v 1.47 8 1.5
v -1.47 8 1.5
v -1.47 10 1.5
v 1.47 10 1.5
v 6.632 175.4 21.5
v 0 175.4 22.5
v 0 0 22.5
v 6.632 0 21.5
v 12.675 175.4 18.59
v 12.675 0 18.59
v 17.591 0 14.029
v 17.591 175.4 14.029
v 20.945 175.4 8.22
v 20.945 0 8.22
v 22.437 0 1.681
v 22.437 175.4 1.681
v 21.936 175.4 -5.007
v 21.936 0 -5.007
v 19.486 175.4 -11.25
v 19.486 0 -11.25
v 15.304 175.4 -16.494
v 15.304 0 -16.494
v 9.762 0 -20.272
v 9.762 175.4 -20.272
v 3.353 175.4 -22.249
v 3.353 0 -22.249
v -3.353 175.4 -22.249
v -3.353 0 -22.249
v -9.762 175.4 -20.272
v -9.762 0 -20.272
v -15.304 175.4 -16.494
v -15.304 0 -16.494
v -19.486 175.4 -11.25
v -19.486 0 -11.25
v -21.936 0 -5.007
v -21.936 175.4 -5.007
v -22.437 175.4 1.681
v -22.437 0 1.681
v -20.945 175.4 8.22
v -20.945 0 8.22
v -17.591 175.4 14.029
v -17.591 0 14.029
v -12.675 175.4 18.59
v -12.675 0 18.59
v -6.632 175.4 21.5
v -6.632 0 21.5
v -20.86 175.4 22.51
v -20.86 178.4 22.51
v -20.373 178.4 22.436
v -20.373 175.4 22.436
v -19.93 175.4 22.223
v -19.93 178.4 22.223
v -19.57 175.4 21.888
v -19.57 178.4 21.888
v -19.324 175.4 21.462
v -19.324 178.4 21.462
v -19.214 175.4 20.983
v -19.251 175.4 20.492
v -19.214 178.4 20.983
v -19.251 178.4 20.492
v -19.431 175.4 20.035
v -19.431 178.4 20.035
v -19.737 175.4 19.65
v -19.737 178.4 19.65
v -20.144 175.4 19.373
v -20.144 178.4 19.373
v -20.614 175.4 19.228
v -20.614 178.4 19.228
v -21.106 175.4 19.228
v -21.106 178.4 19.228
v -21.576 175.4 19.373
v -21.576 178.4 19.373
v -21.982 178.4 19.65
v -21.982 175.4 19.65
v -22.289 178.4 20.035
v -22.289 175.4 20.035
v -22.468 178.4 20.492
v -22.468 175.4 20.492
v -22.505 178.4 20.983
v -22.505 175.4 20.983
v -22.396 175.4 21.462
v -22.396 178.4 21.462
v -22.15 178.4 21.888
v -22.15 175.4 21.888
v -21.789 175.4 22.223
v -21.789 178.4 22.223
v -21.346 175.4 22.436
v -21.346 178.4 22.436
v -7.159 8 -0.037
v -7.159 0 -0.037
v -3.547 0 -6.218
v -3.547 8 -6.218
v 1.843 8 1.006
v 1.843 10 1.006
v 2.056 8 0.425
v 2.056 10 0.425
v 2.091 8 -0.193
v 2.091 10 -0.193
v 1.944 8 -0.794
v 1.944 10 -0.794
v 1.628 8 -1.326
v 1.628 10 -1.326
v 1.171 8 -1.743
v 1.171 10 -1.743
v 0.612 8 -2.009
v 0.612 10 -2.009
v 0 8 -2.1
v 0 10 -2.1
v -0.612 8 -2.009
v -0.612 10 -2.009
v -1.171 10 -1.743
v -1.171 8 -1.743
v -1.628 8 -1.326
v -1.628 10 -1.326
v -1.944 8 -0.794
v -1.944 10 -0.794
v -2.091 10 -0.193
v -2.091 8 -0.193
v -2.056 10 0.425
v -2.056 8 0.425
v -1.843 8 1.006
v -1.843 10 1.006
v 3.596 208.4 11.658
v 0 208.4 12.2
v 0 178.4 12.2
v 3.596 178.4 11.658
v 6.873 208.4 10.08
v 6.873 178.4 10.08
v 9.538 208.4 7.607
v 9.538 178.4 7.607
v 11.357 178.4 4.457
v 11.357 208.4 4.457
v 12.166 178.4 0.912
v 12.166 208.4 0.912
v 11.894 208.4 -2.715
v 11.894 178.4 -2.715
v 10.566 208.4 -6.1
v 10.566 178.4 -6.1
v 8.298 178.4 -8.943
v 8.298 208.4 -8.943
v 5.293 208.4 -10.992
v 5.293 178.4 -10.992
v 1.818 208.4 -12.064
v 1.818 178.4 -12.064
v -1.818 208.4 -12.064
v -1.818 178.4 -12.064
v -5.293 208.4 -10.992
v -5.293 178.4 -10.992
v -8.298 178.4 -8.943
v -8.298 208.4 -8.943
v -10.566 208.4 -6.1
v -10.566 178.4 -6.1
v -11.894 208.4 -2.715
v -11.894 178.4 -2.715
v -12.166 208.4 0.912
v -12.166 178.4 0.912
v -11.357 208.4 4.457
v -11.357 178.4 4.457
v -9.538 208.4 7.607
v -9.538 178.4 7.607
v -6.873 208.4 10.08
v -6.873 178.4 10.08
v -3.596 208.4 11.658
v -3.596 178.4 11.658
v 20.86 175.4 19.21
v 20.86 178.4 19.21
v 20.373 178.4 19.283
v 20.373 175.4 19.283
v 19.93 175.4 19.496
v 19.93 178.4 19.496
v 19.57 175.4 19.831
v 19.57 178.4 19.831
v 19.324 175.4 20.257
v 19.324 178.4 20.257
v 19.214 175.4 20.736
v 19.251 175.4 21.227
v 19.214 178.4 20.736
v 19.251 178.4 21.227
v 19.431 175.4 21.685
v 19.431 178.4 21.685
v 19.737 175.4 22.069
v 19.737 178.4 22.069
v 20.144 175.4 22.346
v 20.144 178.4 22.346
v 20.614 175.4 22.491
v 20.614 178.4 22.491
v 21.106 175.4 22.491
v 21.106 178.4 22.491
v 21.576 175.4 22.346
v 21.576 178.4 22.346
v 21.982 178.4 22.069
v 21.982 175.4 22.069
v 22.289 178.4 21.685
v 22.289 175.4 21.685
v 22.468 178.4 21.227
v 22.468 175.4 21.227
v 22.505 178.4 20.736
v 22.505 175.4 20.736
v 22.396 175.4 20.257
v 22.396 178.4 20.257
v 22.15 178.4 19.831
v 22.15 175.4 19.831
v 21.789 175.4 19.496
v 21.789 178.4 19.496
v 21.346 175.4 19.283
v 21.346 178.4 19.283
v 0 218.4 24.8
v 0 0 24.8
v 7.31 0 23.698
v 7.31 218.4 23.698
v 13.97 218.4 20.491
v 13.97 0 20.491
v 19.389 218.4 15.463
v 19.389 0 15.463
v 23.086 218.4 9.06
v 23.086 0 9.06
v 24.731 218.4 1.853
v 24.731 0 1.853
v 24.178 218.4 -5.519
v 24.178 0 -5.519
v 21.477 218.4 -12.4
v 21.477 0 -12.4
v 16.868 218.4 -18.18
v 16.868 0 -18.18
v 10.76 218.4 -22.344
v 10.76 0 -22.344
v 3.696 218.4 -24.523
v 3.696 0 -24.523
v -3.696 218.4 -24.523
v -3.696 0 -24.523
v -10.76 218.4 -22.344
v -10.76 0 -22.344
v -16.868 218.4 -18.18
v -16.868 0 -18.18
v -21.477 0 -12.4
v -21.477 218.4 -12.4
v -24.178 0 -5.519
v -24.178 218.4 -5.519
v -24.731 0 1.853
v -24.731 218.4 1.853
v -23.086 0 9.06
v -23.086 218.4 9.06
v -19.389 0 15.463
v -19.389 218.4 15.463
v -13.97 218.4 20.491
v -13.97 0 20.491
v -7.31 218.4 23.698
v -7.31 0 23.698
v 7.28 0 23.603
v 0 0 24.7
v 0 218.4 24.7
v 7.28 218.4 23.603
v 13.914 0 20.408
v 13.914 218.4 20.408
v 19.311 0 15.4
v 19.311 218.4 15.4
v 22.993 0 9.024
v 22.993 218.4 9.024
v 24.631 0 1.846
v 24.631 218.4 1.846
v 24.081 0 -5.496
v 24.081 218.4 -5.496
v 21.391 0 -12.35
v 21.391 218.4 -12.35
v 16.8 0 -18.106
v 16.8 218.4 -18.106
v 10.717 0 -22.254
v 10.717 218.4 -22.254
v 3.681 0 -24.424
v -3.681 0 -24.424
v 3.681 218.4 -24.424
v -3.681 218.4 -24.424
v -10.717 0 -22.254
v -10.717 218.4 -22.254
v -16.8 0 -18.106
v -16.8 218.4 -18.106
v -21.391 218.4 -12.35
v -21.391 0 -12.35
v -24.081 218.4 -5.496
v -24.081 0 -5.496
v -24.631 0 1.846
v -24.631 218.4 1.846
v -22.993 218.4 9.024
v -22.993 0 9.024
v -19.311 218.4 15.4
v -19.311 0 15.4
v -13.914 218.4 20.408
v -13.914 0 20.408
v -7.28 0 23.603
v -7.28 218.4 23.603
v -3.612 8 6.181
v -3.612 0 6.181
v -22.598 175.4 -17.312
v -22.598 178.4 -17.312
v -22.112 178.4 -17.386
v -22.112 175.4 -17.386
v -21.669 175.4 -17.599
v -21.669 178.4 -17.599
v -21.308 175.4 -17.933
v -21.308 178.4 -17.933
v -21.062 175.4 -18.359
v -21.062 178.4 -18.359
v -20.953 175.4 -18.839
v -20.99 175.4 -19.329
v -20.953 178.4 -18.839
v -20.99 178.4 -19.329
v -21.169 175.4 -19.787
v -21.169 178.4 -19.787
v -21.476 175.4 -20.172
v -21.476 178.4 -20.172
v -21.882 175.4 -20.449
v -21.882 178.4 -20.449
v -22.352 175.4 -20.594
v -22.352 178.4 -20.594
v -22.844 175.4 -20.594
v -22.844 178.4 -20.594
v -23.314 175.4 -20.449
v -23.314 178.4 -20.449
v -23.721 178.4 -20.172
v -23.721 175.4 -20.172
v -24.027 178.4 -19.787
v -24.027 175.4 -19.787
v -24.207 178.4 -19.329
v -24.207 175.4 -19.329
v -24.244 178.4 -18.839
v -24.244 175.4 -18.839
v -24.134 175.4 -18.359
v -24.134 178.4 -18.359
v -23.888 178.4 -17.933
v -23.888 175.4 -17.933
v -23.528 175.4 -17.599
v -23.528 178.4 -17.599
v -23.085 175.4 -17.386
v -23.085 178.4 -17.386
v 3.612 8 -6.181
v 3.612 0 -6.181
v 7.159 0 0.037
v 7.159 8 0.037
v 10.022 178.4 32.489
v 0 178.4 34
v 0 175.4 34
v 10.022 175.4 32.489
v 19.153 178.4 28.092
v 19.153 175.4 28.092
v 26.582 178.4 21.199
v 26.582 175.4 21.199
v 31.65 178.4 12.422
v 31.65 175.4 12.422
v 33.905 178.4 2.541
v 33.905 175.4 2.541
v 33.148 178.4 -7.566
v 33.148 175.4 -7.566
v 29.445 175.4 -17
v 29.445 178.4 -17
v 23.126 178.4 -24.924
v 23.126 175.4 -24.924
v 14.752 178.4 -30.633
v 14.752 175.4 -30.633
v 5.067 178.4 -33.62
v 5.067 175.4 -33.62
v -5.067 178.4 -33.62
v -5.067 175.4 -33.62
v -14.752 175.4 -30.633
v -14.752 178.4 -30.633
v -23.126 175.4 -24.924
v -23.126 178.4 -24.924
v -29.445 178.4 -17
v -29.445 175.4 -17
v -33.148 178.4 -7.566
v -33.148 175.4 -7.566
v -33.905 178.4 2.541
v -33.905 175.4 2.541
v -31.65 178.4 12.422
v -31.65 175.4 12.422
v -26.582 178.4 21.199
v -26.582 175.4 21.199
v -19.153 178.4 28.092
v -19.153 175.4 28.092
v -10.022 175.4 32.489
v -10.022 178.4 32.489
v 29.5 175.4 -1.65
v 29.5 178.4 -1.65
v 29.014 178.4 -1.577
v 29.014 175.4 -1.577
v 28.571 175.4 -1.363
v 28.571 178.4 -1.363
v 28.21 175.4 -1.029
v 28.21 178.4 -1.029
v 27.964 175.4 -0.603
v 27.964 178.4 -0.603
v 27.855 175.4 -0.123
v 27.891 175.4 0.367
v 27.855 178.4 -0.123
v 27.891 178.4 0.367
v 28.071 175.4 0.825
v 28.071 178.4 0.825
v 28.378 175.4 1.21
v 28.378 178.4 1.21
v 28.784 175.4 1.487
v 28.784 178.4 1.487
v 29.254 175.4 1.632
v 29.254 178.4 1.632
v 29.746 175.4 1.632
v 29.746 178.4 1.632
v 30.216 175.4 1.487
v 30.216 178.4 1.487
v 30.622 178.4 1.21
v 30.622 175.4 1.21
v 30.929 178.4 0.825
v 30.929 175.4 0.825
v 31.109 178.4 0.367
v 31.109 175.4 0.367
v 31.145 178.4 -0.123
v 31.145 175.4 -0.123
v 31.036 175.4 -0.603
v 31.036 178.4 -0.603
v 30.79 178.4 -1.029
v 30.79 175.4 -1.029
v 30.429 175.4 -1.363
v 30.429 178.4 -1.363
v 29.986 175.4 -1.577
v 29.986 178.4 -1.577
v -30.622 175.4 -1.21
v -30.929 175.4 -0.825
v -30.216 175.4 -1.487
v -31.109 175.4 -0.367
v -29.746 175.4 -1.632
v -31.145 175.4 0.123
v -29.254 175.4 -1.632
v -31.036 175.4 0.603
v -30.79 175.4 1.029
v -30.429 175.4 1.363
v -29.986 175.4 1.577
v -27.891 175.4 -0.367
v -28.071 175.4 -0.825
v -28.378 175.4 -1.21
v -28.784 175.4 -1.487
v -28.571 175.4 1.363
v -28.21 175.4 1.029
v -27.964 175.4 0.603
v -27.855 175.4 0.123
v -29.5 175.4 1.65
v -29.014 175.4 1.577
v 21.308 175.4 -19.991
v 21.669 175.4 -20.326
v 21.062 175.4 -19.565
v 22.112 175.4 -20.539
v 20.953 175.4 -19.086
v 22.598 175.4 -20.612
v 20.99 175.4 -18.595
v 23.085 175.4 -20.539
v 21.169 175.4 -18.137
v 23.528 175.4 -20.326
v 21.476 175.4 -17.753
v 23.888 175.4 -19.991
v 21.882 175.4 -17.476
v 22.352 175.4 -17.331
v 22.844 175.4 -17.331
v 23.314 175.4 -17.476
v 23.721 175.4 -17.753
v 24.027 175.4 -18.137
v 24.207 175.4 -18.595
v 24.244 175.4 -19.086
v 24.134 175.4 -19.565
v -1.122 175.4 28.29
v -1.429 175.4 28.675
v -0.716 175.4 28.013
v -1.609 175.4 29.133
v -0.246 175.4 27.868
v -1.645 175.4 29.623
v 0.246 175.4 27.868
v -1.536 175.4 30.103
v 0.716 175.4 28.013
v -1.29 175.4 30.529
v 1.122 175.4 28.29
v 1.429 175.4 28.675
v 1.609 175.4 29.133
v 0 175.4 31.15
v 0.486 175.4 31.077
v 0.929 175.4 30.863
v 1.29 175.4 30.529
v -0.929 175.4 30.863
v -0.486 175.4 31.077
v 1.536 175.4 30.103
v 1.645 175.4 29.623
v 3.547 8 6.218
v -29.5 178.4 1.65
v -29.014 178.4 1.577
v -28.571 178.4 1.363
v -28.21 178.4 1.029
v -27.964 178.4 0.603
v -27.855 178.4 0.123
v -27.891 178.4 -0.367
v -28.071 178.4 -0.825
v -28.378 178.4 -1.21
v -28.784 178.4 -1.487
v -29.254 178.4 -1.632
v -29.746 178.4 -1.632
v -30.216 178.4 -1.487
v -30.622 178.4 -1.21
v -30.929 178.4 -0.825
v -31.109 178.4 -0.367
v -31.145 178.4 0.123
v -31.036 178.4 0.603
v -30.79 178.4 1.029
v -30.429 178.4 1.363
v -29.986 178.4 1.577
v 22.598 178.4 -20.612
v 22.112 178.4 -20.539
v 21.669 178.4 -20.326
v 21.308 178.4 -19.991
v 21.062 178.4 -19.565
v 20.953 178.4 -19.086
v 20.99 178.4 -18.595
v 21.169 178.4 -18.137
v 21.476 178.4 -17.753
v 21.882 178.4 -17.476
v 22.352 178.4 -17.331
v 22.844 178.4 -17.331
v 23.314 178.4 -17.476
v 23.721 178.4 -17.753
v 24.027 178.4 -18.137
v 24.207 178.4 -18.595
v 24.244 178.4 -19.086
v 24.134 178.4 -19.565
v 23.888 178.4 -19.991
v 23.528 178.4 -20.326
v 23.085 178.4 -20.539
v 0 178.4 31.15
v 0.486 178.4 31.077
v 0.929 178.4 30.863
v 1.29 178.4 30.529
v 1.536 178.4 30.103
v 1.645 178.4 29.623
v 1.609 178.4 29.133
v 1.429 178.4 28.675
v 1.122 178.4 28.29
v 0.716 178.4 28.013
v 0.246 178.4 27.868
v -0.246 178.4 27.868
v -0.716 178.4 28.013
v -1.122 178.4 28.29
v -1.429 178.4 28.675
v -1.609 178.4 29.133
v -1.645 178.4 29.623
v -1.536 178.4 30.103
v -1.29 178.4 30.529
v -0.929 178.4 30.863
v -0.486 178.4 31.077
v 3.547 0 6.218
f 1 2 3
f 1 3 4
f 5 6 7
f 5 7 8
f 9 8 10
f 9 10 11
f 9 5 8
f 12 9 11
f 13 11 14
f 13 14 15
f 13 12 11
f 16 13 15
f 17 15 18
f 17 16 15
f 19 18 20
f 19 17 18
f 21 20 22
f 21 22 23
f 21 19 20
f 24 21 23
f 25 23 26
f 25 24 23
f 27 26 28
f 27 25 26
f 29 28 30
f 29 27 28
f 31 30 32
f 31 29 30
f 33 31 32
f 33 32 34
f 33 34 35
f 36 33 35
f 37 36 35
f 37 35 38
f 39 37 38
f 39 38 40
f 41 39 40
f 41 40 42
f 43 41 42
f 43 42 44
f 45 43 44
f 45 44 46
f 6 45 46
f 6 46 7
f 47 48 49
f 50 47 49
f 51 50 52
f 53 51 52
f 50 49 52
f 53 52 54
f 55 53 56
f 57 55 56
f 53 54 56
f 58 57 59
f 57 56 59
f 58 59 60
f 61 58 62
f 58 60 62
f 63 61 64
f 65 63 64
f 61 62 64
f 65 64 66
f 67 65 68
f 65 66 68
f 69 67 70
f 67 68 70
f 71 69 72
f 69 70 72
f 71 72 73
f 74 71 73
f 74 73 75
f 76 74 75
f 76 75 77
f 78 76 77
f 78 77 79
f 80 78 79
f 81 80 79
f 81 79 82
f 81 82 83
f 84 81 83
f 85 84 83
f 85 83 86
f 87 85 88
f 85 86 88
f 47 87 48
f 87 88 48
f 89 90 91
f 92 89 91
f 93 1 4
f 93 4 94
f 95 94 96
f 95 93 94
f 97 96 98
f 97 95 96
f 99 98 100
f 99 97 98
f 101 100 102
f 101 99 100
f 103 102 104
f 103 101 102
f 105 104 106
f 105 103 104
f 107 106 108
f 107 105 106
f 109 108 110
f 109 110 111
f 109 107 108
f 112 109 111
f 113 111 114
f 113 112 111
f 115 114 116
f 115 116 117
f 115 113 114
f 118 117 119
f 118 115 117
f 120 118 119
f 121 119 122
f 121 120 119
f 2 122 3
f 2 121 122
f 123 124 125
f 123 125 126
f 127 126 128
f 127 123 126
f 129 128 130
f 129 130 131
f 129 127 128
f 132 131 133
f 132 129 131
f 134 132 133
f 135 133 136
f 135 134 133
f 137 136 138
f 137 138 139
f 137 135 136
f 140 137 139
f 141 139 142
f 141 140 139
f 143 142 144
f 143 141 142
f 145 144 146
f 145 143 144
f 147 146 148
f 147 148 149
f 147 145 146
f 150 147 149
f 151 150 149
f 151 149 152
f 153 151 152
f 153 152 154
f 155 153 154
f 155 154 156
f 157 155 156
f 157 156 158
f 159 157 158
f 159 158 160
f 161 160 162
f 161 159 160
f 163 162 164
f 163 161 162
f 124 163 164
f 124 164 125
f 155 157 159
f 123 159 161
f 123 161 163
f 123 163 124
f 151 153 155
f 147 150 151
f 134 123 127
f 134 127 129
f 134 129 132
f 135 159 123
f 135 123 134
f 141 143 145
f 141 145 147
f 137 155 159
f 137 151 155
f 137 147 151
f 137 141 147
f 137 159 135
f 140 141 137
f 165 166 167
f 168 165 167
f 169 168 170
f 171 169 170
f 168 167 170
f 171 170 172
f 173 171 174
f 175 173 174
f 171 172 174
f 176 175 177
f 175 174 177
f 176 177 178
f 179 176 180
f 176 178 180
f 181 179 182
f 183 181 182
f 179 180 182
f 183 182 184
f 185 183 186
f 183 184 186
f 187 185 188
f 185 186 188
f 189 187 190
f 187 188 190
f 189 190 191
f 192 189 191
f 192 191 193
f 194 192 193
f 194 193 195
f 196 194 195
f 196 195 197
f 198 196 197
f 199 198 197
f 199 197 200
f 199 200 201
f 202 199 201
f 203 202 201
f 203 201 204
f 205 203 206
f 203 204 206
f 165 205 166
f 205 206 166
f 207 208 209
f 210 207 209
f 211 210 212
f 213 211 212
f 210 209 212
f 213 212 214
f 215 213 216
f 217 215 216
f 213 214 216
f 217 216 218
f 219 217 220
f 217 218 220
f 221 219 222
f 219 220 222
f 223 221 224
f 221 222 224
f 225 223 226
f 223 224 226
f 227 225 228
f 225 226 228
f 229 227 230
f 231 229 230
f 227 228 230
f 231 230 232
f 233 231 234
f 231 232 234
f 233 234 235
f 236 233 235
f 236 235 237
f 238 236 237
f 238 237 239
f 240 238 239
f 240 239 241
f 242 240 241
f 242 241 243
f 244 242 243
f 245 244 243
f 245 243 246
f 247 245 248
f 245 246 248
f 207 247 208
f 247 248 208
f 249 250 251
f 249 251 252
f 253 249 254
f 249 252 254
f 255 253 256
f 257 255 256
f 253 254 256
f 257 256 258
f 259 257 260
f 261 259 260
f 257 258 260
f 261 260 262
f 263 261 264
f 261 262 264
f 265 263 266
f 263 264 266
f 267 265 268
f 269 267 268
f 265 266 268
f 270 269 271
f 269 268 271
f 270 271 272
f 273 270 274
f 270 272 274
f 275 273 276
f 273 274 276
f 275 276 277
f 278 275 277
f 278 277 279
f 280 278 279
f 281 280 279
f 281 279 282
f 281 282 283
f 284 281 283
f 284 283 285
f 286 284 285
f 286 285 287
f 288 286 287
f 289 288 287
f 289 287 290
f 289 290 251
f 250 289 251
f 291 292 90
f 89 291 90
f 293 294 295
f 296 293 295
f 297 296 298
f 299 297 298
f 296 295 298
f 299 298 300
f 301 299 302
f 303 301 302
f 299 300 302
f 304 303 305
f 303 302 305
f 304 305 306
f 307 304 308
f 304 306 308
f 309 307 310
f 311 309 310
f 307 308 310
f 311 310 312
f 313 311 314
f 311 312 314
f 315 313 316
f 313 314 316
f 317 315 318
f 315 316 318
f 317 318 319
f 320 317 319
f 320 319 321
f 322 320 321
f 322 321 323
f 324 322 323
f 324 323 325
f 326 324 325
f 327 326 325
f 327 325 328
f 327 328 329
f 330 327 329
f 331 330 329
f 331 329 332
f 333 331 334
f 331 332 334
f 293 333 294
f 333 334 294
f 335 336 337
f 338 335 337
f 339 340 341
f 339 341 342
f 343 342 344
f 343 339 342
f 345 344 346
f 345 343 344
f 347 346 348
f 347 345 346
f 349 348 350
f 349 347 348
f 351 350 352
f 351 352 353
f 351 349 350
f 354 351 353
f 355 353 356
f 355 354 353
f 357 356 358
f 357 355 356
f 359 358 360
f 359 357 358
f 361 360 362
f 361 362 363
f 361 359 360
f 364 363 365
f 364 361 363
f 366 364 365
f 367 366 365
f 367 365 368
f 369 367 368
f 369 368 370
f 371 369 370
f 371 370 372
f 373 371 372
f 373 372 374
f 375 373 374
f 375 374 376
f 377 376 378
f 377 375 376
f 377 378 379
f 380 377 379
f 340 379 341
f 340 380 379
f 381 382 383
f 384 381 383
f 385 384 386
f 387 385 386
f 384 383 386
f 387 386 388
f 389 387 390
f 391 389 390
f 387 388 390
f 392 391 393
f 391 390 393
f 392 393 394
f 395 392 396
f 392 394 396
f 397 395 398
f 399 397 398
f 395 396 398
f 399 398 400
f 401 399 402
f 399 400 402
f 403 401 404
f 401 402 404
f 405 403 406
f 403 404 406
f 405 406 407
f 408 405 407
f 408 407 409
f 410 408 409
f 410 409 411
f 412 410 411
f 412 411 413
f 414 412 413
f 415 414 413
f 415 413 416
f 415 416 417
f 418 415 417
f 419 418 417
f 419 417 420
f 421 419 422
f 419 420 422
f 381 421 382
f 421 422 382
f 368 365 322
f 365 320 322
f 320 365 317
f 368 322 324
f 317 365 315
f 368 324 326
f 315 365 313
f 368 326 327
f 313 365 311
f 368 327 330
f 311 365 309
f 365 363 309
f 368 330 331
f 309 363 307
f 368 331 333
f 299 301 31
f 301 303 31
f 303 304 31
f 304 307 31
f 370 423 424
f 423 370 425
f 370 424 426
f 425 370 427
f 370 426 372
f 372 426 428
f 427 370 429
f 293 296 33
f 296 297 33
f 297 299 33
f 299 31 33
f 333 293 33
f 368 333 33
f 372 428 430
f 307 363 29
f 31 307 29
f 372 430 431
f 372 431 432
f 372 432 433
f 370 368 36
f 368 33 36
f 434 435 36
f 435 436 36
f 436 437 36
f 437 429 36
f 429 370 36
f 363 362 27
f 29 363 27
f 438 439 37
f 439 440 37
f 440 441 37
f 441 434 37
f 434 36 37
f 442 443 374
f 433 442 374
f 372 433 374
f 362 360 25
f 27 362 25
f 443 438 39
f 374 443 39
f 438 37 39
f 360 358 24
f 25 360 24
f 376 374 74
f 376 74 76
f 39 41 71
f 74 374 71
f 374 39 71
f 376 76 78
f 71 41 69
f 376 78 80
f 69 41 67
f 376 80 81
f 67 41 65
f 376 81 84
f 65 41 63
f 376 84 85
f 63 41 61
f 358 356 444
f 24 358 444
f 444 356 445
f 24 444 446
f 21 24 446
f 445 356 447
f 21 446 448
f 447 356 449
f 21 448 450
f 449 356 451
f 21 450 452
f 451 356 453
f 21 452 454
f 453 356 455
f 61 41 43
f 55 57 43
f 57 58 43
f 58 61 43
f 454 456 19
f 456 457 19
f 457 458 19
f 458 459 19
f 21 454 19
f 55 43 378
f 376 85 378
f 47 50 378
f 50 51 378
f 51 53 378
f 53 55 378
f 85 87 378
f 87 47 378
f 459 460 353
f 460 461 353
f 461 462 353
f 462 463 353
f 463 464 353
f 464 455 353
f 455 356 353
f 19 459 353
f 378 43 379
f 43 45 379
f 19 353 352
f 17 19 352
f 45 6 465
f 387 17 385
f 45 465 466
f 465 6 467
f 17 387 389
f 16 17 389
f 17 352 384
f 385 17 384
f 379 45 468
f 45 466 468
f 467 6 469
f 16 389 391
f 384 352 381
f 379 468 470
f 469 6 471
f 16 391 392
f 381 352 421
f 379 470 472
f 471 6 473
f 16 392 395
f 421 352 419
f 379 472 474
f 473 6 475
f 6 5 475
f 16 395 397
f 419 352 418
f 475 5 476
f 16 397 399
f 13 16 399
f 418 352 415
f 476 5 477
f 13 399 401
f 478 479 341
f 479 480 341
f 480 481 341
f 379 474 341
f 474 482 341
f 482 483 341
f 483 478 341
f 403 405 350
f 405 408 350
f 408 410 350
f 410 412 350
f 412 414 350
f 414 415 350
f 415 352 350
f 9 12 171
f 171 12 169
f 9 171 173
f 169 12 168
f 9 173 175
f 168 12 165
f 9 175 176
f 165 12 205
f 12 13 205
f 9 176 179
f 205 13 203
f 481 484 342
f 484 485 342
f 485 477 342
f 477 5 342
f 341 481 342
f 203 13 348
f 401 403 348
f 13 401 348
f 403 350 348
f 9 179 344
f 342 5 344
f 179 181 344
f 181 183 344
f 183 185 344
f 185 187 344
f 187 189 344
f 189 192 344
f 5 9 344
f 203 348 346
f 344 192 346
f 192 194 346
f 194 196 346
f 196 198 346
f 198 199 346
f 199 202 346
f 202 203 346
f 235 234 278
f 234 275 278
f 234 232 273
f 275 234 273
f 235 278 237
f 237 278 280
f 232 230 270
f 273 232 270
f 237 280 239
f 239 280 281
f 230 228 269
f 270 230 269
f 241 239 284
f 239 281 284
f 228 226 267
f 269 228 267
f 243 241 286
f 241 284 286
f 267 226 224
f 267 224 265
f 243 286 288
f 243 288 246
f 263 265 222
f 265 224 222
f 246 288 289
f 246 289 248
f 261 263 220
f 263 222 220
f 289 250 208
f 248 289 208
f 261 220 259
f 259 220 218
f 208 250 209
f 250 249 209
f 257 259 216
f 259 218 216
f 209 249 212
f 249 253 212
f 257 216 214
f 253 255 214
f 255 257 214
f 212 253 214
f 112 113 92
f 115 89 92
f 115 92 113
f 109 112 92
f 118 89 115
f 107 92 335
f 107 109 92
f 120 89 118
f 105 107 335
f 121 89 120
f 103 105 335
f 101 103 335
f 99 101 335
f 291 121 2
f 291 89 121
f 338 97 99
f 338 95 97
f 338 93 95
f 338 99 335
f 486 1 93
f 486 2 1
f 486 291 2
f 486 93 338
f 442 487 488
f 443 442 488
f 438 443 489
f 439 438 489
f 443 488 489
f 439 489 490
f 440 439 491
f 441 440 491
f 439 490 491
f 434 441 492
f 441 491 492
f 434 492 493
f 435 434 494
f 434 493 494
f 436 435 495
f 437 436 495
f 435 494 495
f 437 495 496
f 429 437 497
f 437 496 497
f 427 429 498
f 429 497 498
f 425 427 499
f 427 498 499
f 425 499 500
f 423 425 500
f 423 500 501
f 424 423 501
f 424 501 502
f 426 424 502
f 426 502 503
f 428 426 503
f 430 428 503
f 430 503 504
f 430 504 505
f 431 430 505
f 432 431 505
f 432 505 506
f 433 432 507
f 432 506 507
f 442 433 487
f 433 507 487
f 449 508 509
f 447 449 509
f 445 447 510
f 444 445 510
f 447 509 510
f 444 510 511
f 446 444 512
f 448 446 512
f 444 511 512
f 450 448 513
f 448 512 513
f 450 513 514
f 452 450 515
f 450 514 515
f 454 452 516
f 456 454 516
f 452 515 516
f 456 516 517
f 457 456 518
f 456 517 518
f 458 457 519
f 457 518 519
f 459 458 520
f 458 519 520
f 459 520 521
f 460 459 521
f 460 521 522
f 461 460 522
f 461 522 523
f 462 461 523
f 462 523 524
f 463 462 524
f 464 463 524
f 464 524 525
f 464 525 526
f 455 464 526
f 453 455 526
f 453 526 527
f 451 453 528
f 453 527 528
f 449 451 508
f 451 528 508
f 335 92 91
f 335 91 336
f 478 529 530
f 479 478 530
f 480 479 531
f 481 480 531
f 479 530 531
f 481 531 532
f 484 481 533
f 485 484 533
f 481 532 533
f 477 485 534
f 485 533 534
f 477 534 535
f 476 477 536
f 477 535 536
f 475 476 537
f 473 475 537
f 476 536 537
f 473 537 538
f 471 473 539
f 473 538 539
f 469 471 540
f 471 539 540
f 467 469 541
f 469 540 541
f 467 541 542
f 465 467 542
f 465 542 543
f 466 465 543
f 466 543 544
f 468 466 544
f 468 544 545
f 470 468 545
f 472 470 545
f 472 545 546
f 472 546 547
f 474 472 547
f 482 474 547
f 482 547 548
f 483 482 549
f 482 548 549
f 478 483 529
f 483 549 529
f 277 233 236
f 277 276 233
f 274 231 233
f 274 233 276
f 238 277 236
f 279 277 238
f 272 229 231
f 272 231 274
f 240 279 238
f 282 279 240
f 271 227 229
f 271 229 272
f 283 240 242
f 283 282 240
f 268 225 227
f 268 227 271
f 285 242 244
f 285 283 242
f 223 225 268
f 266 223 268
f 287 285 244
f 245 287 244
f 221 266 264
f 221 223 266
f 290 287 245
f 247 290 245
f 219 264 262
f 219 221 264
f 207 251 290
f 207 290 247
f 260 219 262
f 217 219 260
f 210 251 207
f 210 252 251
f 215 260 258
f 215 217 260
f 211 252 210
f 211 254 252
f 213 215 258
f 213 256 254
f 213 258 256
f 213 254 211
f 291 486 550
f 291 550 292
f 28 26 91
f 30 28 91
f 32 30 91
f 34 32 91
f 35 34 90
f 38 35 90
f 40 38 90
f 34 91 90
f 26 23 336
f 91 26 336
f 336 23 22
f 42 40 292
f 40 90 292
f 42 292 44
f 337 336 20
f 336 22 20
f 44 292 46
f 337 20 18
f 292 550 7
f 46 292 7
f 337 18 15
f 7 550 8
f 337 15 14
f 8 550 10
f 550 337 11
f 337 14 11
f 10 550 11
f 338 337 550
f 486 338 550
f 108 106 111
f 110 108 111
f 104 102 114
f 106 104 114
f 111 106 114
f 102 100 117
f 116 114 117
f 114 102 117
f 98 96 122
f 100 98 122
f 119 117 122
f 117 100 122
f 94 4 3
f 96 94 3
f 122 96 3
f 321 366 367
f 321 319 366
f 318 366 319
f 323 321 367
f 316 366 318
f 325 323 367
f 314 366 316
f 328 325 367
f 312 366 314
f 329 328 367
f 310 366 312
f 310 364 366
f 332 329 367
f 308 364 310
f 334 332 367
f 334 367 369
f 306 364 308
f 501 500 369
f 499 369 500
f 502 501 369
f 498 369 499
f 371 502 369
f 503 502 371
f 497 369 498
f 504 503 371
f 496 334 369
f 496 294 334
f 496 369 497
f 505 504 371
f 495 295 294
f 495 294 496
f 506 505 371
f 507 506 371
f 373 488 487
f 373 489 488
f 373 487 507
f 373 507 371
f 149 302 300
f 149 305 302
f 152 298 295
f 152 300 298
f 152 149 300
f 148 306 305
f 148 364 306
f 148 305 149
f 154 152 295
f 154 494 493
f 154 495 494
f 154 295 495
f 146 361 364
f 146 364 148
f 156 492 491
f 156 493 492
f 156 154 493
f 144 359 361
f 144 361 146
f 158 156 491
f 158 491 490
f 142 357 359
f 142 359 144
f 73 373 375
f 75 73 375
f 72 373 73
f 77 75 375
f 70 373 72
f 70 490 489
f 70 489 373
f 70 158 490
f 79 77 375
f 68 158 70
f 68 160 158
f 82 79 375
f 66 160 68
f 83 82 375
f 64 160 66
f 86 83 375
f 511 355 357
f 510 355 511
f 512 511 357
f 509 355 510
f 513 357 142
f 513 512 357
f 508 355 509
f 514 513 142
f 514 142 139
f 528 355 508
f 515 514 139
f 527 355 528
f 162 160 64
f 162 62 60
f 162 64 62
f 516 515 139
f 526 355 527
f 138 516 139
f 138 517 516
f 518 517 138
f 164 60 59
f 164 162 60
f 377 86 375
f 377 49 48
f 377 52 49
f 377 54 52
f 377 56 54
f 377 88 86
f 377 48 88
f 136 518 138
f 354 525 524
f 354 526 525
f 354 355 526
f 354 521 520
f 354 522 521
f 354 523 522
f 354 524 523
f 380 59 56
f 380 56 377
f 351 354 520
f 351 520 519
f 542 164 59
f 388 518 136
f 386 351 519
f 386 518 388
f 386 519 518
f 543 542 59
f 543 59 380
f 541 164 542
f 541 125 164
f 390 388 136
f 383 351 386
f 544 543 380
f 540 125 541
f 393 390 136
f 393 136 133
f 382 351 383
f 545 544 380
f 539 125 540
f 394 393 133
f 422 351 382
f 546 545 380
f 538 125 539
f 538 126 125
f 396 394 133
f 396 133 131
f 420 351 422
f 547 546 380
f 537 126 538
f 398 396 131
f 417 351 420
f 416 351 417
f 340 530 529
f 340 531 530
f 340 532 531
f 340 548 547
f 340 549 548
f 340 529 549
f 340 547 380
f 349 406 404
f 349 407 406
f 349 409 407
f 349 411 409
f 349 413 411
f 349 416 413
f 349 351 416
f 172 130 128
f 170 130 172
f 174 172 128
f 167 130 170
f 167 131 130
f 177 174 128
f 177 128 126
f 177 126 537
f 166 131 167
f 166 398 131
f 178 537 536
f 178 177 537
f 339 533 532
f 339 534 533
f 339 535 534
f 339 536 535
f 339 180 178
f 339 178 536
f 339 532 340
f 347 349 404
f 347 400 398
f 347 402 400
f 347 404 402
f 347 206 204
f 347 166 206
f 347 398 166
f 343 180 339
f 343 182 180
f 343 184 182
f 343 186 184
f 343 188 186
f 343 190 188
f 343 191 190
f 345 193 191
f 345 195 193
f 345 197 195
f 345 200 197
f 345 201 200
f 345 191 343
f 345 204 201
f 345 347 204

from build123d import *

# Parameters (mm, degrees)
CROQUIS1_R              = 24.8
SALIENTE_EXTRUIR1_DEPTH = 218.4
CORTAR_EXTRUIR1_DEPTH   = 10
CROQUIS3_R              = 12.2
SALIENTE_EXTRUIR2_DEPTH = 30
CORTAR_EXTRUIR2_DEPTH   = 8
CROQUIS5_R              = 24.7
CROQUIS5_R_2            = 22.5
CORTAR_EXTRUIR3_DEPTH   = 300
CROQUIS6_R              = 25.872399076
CORTAR_EXTRUIR4_DEPTH   = 40
CROQUIS7_R              = 30.018047562
CROQUIS7_R_2            = 12.2
CORTAR_EXTRUIR5_DEPTH   = 30
CROQUIS8_R              = 34
CROQUIS8_R_2            = 1.65
CROQUIS8_R_3            = 22.3
SALIENTE_EXTRUIR3_DEPTH = 3


with BuildPart() as part:
    # Croquis1 → Saliente-Extruir1 (new body)
    with BuildSketch(Plane(origin=(0, 0, 0), x_dir=(1, 0, 0), z_dir=(0, 1, 0))):
        with Locations(Location((0, 0, 0), (0, 0, 270))):
            Circle(CROQUIS1_R)
    extrude(amount=SALIENTE_EXTRUIR1_DEPTH)

    # Croquis2 → Cortar-Extruir1 (cut)
    with BuildSketch(Plane.XZ):
        with BuildLine():
            Line((0, 1.5), (1.469693846, 1.5))
            ThreePointArc((1.469693846, 1.5), (0, -2.1), (-1.469693846, 1.5))
            Line((-1.469693846, 1.5), (0, 1.5))
        make_face()
    extrude(amount=-CORTAR_EXTRUIR1_DEPTH, mode=Mode.SUBTRACT)

    # Croquis3 → Saliente-Extruir2 (add)
    with BuildSketch(Plane(origin=(0, 218.4, 0), x_dir=(1, 0, 0), z_dir=(0, 1, 0))):
        with Locations(Location((0, 0, 0), (0, 0, 270))):
            Circle(CROQUIS3_R)
    extrude(amount=SALIENTE_EXTRUIR2_DEPTH)

    # Croquis4 → Cortar-Extruir2 (cut)
    with BuildSketch(Plane.XZ):
        Polygon((3.547480629, 6.218417365), (-3.611567095, 6.181417026), (-7.159047724, -0.037000339), (-3.547480629, -6.218417365), (3.611567095, -6.181417026), (7.159047724, 0.037000339), align=None)
    extrude(amount=-CORTAR_EXTRUIR2_DEPTH, mode=Mode.SUBTRACT)

    # Croquis5 → Cortar-Extruir3 (cut)
    with BuildSketch(Plane(origin=(0, 218.4, 0), x_dir=(1, 0, 0), z_dir=(0, 1, 0))):
        with Locations(Location((0, 0, 0), (0, 0, 270))):
            Circle(CROQUIS5_R)
        with Locations(Location((0, 0, 0), (0, 0, 270))):
            Circle(CROQUIS5_R_2, mode=Mode.SUBTRACT)
    extrude(amount=-CORTAR_EXTRUIR3_DEPTH, mode=Mode.SUBTRACT)


with BuildPart() as cortar_extruir3_piece_1:
    # of the separate pieces the step leaves, piece 1, a body of its own (cortar_extruir3_pieces)
    add(part.part.solids().sort_by_distance((0, 0, 22.5))[0])

    # Croquis6 → Cortar-Extruir4 (cut)
    with BuildSketch(Plane(origin=(0, 248.4, 0), x_dir=(1, 0, 0), z_dir=(0, 1, 0))):
        Circle(CROQUIS6_R)
    extrude(amount=-CORTAR_EXTRUIR4_DEPTH, mode=Mode.SUBTRACT)

    # Croquis7 → Cortar-Extruir5 (cut)
    with BuildSketch(Plane(origin=(0, 208.4, 0), x_dir=(1, 0, 0), z_dir=(0, 1, 0))):
        Circle(CROQUIS7_R)
        with Locations(Location((0, 0, 0), (0, 0, 270))):
            Circle(CROQUIS7_R_2, mode=Mode.SUBTRACT)
    extrude(amount=-CORTAR_EXTRUIR5_DEPTH, mode=Mode.SUBTRACT)

    # Croquis8 → Saliente-Extruir3 (add)
    with BuildSketch(Plane(origin=(0, 178.4, 0), x_dir=(1, 0, 0), z_dir=(0, 1, 0))):
        with Locations(Location((0, 0, 0), (0, 0, 270))):
            Circle(CROQUIS8_R)
        with Locations(Location((-22.598311072, 18.962234486, 0), (0, 0, 270))):
            Circle(CROQUIS8_R_2, mode=Mode.SUBTRACT)
        with Locations(Location((-29.5, 0, 0), (0, 0, 270))):
            Circle(CROQUIS8_R_2, mode=Mode.SUBTRACT)
        with Locations(Location((-20.859650045, -20.859650045, 0), (0, 0, 270))):
            Circle(CROQUIS8_R_2, mode=Mode.SUBTRACT)
        with Locations(Location((0, -29.5, 0), (0, 0, 270))):
            Circle(CROQUIS8_R_2, mode=Mode.SUBTRACT)
        with Locations(Location((20.859650045, -20.859650045, 0), (0, 0, 90))):
            Circle(CROQUIS8_R_2, mode=Mode.SUBTRACT)
        with Locations(Location((22.598311072, 18.962234486, 0), (0, 0, 90))):
            Circle(CROQUIS8_R_2, mode=Mode.SUBTRACT)
        with Locations(Location((29.5, 0, 0), (0, 0, 90))):
            Circle(CROQUIS8_R_2, mode=Mode.SUBTRACT)
        Circle(CROQUIS8_R_3, mode=Mode.SUBTRACT)
    extrude(amount=-SALIENTE_EXTRUIR3_DEPTH)


with BuildPart() as cortar_extruir3_piece_2:
    # of the separate pieces the step leaves, piece 2, a body of its own (cortar_extruir3_pieces)
    add(part.part.solids().sort_by_distance((0, 0, 24.8))[0])


solid = Compound([cortar_extruir3_piece_1.part, cortar_extruir3_piece_2.part])
